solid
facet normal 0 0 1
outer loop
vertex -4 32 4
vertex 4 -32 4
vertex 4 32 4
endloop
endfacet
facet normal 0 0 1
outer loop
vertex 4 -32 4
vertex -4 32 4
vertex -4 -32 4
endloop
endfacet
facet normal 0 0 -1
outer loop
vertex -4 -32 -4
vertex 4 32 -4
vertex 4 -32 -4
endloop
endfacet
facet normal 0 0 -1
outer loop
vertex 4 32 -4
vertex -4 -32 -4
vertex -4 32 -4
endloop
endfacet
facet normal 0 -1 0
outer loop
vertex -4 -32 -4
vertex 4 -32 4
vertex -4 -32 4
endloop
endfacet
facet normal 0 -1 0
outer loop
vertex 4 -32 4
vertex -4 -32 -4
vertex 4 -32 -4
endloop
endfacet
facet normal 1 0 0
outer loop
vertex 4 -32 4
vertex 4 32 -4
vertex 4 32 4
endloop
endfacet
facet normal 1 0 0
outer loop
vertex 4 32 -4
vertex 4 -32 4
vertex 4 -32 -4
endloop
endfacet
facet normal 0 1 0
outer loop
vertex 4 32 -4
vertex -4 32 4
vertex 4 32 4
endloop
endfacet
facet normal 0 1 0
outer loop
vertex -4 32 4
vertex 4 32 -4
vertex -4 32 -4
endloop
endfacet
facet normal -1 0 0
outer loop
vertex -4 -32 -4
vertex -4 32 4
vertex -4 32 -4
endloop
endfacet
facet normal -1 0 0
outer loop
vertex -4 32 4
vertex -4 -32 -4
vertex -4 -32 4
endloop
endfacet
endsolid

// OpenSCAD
// Generated by Mecha (https://github.com/tomahawkins/mecha)

color([0.5, 0.5, 0.5, 1.0]) scale ([1.0, 8.0, 1.0]) translate ([-4.0, -4.0, -4.0]) cube(size = [8.0, 8.0, 8.0], center = false);
